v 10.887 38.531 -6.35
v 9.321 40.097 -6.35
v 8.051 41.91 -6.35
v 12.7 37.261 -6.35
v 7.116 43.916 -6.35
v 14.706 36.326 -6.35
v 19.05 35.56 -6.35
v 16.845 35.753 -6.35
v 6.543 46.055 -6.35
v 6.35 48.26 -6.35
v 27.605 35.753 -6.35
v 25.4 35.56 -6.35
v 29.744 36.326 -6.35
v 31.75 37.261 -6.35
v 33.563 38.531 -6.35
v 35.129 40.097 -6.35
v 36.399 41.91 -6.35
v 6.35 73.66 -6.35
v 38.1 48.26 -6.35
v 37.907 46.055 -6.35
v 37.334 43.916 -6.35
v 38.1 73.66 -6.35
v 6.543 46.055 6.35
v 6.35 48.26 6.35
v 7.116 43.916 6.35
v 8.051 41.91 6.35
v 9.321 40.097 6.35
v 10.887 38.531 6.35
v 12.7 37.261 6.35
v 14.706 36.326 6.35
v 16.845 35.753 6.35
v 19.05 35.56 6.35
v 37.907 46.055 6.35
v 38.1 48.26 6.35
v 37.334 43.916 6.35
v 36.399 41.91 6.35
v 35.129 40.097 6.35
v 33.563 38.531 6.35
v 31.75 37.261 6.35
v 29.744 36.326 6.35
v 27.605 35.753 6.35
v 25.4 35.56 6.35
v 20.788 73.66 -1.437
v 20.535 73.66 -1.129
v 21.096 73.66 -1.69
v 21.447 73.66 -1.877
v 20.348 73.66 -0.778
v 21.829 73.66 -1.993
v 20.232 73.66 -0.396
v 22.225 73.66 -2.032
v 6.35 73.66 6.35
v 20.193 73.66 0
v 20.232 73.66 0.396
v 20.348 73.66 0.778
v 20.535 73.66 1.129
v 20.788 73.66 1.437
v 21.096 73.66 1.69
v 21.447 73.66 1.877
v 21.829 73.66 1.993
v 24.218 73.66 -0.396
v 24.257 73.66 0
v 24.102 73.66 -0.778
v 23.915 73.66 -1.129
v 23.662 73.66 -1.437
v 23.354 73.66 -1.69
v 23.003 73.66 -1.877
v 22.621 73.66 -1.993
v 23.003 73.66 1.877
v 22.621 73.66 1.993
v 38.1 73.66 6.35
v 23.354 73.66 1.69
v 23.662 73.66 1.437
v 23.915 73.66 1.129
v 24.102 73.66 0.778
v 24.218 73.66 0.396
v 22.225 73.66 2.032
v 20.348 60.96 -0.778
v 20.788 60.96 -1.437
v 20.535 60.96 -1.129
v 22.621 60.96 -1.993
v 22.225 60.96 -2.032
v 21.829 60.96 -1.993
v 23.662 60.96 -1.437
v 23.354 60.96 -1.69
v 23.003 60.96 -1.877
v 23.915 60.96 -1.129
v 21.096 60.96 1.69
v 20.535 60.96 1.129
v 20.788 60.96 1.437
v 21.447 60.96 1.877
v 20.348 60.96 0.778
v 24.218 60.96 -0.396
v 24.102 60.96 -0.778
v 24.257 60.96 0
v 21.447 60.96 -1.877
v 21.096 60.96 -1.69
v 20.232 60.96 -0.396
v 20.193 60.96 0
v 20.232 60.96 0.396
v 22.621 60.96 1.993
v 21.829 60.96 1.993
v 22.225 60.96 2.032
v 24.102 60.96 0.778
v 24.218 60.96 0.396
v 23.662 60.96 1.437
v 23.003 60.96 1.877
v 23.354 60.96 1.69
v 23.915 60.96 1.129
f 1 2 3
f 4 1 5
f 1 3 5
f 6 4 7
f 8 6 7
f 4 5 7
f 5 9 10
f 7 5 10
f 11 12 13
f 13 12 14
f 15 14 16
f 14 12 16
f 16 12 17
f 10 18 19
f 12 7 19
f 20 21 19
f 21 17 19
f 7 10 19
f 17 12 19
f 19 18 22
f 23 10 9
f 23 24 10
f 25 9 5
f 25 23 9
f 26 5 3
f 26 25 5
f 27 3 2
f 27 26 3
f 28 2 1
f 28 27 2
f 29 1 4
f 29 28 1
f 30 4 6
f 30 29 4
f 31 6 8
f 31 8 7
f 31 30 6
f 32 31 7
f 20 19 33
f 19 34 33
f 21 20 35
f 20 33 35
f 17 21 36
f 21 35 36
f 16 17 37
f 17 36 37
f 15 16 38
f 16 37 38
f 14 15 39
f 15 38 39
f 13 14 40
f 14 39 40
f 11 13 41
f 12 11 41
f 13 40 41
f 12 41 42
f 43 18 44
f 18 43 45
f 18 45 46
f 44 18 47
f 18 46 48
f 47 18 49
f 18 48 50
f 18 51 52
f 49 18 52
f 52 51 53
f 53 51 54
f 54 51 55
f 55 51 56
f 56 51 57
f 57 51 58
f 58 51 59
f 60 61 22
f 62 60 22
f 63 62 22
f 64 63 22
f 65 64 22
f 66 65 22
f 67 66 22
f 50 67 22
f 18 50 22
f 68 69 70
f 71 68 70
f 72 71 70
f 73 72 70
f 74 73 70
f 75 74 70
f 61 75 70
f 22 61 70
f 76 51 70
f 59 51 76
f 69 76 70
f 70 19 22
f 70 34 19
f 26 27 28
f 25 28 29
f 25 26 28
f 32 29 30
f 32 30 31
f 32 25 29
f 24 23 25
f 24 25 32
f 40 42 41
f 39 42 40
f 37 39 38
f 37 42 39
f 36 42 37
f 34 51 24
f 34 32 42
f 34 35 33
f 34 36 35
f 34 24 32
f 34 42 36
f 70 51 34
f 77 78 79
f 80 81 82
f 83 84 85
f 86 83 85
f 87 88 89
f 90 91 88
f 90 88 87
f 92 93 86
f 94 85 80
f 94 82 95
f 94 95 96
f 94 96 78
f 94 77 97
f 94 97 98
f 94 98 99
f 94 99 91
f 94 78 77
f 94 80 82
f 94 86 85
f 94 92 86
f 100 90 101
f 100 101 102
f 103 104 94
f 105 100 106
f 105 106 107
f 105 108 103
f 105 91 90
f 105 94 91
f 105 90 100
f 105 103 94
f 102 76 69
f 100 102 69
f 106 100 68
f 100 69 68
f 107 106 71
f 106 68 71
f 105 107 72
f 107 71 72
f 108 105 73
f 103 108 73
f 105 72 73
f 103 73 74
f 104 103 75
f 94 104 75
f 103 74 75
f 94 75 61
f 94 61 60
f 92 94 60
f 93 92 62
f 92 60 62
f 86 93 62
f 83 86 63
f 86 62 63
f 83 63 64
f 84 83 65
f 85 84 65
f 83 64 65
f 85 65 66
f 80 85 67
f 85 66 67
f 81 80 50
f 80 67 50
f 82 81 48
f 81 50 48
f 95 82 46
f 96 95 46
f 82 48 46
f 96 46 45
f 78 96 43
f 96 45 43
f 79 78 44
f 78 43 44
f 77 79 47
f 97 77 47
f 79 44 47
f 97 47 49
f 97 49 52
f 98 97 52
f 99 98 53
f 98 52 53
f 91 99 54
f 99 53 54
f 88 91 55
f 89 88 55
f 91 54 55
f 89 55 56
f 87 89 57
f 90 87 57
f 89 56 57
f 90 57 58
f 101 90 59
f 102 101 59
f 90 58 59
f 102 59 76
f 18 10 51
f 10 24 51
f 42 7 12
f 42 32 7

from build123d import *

# Parameters (mm, degrees)
SKETCH1_W          = 31.75
SKETCH1_H          = 38.1
EXTRUDE1_DEPTH     = 6.35
FILLET1_R          = 12.7
SKETCH2_R          = 2.032
CUT_EXTRUDE1_DEPTH = 12.7


with BuildPart() as part:
    # Sketch1 → Extrude1 (new, symmetric)
    with BuildSketch(Plane.XY):
        with Locations((22.225, 54.61)):
            Rectangle(SKETCH1_W, SKETCH1_H)
    extrude(amount=EXTRUDE1_DEPTH, both=True)

    # Fillet1
    fillet1_edges = [part.edges().sort_by_distance(p)[0] for p in [
        (38.1, 35.56, 0),
        (6.35, 35.56, 0),
    ]]
    fillet(fillet1_edges, radius=FILLET1_R)

    # Sketch2 → Cut-Extrude1 (cut)
    with BuildSketch(Plane(origin=(0, 73.66, 0), x_dir=(-1, 0, 0), z_dir=(0, 1, 0))):
        with Locations(Location((-22.225, 0, 0), (0, 0, 90))):
            Circle(SKETCH2_R)
    extrude(amount=-CUT_EXTRUDE1_DEPTH, mode=Mode.SUBTRACT)


solid = part.part
